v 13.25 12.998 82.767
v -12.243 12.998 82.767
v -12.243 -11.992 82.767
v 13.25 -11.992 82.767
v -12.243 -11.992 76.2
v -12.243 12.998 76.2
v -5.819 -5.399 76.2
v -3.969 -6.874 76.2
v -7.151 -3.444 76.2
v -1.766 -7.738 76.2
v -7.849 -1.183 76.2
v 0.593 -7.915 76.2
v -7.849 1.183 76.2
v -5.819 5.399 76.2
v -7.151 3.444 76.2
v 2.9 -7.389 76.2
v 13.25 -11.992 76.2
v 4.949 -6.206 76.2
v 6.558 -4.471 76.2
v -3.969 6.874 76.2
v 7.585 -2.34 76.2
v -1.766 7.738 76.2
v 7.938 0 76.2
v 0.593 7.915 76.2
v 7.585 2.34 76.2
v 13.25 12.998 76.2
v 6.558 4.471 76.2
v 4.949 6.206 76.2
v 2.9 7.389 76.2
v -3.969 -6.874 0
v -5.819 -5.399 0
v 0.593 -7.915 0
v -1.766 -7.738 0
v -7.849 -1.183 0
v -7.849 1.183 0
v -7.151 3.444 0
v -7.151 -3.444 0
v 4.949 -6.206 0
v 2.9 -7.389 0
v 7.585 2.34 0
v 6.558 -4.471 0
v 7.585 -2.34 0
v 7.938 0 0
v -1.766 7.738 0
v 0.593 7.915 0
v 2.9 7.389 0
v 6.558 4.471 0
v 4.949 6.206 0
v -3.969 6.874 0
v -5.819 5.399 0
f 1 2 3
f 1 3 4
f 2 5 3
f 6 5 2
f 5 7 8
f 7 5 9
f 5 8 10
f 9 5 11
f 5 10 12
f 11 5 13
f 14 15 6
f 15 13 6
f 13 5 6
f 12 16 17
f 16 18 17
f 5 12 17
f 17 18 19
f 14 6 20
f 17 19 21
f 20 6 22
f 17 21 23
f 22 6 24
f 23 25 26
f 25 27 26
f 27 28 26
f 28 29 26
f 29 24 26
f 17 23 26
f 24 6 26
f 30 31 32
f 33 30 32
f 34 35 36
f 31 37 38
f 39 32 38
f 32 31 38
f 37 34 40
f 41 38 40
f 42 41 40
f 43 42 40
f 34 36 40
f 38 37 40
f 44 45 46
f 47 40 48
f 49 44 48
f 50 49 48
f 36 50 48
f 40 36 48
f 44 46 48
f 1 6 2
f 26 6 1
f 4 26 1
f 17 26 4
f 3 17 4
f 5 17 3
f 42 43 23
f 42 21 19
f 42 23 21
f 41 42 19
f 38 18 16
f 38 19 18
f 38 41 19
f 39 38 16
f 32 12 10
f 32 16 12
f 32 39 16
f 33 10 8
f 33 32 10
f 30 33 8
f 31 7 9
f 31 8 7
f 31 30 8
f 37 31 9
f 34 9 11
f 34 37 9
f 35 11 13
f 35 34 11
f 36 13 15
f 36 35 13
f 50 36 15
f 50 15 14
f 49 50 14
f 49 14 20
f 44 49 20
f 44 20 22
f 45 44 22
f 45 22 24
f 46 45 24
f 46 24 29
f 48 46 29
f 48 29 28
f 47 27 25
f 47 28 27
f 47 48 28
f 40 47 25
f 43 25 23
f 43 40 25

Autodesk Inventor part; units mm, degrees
ref_plane "YZ Plane" through (0, 0, 0) normal (1, 0, 0) x (0, 1, 0)
ref_plane "XZ Plane" through (0, 0, 0) normal (0, 1, 0) x (-1, 0, 0)
ref_plane "XY Plane" through (0, 0, 0) normal (0, 0, 1) x (1, 0, 0)
sketch "Sketch1" plane through (0, 0, 0) normal (0, 0, 1) x (1, 0, 0)
  circle A0 centre (0, 0) radius 7.9375
  dimension "d0" = 15.875
extrude "Extrusion1" add sketch "Sketch1" along normal blind 76.2
sketch "Sketch2" plane through (0, 0, 76.2) normal (0, 0, 1) x (1, 0, 0)
  line L0 (-12.2432, 12.9979) -> (13.2495, 12.9979)
  line L1 (13.2495, 12.9979) -> (13.2495, -11.9916)
  line L2 (13.2495, -11.9916) -> (-12.2432, -11.9916)
  line L3 (-12.2432, -11.9916) -> (-12.2432, 12.9979)
  point P0 (0, 0)
extrude "Extrusion2" add sketch "Sketch2" along normal blind 6.5673
properties part number "KBOLT"
